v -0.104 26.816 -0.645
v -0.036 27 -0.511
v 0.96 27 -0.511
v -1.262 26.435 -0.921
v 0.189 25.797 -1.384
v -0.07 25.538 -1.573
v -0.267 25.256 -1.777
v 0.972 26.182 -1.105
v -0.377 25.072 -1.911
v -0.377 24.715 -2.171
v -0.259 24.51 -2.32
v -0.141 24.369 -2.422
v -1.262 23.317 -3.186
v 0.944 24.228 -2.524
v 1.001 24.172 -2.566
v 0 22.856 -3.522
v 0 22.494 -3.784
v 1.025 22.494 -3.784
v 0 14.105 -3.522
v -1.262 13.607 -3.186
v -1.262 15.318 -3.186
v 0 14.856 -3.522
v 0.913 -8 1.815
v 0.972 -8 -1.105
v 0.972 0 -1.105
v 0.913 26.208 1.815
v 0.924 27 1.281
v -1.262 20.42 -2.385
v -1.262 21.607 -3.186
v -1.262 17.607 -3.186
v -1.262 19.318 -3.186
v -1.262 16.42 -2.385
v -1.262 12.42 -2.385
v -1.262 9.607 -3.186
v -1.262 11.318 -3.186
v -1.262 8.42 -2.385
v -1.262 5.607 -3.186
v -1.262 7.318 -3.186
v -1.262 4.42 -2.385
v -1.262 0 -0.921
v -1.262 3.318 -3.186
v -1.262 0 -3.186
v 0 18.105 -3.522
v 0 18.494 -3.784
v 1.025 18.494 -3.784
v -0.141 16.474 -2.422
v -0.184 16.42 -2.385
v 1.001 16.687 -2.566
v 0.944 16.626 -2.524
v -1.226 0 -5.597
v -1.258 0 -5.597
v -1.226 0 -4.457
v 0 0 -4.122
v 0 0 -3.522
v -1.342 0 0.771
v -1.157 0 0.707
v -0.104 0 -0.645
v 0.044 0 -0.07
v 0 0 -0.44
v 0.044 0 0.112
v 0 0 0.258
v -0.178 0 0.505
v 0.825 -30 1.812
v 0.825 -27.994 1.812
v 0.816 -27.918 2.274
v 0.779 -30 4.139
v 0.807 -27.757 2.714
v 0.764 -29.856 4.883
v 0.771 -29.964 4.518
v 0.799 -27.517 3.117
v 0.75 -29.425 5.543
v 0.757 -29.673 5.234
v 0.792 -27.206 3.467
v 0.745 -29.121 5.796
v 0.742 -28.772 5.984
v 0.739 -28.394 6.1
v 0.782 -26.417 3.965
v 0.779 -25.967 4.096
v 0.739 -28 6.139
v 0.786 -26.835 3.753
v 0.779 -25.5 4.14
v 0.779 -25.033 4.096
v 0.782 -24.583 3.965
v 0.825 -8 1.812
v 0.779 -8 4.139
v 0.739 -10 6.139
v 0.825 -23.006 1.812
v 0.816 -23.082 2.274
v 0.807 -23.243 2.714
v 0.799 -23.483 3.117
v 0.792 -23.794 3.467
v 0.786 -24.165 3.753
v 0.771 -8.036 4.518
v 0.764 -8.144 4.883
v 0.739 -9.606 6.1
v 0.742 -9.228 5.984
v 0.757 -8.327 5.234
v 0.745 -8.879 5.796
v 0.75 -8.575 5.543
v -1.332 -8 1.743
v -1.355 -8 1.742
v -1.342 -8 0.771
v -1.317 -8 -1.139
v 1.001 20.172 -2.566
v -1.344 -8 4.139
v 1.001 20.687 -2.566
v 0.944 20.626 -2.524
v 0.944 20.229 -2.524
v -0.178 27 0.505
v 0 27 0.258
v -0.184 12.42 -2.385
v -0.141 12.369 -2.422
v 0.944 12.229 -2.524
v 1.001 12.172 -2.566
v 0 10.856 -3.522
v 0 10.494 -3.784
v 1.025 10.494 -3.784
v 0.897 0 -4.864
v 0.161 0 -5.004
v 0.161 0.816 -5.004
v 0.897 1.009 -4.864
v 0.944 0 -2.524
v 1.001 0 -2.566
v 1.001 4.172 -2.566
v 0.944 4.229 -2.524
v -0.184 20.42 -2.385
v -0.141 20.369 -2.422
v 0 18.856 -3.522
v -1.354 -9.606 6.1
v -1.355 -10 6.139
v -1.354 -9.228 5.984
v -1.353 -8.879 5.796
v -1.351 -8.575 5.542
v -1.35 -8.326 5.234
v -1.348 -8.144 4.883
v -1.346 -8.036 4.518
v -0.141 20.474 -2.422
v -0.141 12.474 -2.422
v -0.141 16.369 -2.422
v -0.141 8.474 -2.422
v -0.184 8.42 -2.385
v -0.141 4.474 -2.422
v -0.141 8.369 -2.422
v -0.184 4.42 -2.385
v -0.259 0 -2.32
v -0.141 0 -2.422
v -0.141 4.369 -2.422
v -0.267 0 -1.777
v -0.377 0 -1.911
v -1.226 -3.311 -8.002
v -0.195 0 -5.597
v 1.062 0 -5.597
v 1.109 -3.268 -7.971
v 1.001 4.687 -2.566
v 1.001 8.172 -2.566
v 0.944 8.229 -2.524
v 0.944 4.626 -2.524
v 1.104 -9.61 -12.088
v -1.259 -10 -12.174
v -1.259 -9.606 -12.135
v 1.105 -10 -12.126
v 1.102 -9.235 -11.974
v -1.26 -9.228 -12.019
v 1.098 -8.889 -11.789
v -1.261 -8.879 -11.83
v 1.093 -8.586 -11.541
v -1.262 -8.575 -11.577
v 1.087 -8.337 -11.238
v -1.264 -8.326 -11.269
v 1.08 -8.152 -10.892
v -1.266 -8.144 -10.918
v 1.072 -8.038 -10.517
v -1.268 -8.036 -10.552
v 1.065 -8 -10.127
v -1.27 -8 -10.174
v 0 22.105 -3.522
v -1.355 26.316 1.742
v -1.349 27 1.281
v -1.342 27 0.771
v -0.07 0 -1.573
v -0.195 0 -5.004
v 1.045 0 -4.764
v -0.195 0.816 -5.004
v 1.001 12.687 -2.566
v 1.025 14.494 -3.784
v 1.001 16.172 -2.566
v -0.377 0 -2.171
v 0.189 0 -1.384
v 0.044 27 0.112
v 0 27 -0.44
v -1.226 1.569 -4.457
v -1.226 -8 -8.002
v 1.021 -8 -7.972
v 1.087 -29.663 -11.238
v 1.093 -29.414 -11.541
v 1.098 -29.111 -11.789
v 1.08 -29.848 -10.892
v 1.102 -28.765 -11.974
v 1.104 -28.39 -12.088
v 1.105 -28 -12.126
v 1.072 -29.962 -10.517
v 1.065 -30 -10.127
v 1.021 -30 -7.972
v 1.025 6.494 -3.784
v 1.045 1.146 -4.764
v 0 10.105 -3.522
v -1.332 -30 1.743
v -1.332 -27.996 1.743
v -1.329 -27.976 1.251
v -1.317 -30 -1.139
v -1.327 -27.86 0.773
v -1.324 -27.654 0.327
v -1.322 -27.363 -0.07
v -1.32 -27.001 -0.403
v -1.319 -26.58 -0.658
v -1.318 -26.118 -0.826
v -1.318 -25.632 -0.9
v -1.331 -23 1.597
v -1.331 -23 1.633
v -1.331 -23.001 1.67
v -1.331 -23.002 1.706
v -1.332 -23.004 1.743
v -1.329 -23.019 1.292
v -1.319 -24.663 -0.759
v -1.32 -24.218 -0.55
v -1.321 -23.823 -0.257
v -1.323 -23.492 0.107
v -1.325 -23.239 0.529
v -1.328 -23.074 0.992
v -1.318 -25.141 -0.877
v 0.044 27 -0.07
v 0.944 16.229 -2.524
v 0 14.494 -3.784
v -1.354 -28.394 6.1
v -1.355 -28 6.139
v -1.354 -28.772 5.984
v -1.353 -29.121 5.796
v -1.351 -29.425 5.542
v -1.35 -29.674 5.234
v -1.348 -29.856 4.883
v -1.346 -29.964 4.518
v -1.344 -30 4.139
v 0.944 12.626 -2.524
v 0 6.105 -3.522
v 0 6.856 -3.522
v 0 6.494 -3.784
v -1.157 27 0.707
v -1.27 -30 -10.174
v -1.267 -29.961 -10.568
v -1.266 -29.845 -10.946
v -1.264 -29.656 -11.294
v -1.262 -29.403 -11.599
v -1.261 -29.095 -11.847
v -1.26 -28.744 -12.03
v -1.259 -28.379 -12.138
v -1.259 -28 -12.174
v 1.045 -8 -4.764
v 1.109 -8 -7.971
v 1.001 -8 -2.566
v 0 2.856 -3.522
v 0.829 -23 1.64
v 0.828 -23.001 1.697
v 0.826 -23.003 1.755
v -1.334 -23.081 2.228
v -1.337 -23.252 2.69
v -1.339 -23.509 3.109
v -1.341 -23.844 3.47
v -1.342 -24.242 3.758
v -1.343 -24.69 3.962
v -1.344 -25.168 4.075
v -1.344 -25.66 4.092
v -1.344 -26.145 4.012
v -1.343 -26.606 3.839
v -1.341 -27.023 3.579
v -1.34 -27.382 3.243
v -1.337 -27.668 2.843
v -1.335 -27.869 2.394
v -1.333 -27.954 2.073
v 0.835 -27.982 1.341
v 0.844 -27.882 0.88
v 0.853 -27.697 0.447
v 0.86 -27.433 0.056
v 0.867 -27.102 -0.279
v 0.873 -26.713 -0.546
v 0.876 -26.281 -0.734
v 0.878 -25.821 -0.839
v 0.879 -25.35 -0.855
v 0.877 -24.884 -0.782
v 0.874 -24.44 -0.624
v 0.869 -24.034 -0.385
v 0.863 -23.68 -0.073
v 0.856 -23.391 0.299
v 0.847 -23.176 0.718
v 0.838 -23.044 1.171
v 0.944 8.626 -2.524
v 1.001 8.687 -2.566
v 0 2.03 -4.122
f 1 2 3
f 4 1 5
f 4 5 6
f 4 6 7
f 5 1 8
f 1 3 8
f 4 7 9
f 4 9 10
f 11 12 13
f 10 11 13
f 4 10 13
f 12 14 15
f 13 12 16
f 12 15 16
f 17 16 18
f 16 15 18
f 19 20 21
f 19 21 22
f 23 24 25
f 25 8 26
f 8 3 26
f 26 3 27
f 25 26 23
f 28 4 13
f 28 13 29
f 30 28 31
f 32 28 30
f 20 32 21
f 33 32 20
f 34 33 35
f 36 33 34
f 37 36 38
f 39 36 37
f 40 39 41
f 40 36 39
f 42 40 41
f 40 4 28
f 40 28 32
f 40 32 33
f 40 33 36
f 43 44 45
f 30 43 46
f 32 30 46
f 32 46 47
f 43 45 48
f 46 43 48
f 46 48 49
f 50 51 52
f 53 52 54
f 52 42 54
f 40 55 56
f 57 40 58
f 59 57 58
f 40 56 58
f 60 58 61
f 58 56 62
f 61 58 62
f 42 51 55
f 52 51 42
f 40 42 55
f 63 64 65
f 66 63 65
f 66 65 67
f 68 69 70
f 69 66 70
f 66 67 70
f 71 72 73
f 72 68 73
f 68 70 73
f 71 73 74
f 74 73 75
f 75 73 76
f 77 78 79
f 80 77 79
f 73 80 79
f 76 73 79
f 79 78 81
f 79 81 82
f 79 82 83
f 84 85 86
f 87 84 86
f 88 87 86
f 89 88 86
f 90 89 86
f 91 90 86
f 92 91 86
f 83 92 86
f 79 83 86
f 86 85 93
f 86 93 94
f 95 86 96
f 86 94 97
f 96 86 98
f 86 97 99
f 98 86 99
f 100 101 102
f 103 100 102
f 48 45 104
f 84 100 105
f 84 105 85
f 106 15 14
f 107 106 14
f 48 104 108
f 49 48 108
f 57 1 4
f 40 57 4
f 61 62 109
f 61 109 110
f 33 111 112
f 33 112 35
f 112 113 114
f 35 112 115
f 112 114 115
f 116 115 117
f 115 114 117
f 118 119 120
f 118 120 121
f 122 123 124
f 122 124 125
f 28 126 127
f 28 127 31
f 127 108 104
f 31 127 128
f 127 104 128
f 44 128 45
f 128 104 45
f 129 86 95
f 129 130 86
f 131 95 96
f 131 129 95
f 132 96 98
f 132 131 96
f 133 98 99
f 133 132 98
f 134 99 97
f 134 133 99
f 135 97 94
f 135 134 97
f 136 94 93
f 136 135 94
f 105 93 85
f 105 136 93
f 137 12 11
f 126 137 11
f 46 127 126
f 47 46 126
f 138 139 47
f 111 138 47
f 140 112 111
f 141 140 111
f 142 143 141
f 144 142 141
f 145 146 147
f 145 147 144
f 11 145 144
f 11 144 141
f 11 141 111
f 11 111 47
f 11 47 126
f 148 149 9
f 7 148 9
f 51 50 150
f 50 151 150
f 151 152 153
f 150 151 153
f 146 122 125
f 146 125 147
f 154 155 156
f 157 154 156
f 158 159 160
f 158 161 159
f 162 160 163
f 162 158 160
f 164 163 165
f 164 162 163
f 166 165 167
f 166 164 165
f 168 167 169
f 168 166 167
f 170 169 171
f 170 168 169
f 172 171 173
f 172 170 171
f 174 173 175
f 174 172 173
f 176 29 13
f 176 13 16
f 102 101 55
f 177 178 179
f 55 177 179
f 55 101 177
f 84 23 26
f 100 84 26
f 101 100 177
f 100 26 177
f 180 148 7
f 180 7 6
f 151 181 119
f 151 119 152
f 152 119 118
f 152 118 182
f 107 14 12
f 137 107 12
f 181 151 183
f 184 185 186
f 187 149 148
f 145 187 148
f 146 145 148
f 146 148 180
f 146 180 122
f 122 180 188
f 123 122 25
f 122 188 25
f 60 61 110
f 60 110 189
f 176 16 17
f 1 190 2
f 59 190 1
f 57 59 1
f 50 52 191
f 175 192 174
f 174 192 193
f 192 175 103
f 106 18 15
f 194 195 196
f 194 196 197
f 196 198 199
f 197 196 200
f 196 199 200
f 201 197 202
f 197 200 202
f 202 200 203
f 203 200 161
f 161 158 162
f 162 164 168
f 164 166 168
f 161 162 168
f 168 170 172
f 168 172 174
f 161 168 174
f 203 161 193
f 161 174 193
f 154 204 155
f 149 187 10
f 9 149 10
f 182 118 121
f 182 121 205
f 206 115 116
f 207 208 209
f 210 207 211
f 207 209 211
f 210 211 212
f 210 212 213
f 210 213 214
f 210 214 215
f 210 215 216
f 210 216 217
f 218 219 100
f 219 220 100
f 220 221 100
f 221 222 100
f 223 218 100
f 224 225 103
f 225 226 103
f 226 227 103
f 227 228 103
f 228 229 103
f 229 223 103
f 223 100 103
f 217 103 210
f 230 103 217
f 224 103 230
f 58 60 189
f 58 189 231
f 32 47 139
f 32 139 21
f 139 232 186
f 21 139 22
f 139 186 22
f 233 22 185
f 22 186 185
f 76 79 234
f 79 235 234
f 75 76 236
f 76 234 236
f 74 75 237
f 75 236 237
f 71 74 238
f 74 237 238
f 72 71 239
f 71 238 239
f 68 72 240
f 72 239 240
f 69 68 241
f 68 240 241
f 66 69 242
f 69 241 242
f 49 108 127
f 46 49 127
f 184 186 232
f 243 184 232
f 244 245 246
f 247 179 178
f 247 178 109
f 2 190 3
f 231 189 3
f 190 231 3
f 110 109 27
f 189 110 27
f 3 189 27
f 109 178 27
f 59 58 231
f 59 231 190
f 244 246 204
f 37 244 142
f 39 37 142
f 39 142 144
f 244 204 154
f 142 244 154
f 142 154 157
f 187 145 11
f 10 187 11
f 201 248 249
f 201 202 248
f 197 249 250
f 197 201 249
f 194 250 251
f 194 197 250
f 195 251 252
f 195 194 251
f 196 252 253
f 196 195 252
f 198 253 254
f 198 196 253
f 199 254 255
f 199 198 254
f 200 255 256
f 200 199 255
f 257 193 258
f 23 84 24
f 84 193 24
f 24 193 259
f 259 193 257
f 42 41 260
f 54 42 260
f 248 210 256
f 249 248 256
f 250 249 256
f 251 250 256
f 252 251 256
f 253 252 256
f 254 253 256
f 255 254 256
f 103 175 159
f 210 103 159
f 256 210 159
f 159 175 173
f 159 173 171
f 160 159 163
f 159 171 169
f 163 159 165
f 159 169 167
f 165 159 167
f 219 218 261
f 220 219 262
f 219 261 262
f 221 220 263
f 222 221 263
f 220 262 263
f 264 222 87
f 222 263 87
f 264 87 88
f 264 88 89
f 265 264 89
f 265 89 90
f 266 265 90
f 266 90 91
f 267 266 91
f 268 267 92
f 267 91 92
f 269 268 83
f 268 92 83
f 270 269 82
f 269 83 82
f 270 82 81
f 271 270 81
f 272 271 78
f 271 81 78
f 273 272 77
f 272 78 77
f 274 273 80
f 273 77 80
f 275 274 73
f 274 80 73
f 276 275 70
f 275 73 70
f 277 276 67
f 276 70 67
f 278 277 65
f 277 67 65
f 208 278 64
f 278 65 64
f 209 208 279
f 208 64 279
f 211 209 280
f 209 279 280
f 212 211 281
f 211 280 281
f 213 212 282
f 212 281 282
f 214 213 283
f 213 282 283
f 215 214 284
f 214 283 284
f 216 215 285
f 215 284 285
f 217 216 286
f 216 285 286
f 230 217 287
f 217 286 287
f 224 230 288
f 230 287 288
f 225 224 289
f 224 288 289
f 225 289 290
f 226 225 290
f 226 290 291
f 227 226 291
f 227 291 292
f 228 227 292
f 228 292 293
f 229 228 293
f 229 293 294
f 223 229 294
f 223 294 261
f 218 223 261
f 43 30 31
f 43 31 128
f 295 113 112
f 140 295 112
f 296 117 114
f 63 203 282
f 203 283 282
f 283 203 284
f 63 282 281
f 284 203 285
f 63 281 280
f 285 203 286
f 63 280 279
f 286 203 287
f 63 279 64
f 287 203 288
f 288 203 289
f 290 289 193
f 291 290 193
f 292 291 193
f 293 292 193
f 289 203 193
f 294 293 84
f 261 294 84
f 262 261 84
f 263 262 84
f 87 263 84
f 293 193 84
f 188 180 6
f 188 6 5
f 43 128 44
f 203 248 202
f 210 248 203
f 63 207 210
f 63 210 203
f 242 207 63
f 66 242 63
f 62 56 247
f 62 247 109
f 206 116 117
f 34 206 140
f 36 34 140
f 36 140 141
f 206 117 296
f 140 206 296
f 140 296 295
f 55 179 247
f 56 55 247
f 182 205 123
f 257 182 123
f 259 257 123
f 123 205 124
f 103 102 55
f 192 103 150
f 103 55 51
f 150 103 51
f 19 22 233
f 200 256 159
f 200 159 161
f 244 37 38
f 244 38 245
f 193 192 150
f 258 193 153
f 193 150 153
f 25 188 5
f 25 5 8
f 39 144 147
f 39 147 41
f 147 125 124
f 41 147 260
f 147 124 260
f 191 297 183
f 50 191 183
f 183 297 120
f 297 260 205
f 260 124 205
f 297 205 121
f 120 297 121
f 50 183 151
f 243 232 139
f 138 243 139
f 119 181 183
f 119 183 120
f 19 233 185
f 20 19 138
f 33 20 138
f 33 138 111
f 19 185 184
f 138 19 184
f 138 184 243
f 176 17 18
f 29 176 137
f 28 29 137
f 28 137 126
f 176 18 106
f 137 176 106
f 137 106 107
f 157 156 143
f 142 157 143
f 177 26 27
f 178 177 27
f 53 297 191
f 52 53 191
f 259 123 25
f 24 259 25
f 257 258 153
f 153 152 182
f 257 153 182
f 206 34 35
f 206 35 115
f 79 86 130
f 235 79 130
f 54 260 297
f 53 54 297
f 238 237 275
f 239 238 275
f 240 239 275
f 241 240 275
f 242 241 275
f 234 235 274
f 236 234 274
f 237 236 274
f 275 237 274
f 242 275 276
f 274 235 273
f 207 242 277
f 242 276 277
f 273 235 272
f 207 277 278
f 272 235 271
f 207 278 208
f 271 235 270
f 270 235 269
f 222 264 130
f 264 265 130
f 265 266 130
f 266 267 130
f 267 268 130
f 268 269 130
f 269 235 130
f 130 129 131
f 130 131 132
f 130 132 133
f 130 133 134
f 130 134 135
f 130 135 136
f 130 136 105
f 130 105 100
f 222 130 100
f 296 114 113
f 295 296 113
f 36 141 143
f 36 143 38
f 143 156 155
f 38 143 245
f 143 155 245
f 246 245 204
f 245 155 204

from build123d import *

# Parameters (mm, degrees)
F1_DEPTH  = 27
F2_DEPTH  = 8
F4_DEPTH  = 22
F6_R      = 2
F8_DEPTH  = 20
F9_DEPTH  = 12.5
F5_R      = 2.5
F10_DEPTH = 2.4607981127
F11_DEPTH = 12.5


with BuildPart() as f1:
    # F0 (on Front) → F1 (new body)
    with BuildSketch(Plane.XZ):
        Polygon((-0.7496952344, -6.6809873255), (0.8741063205, -6.6809873255), (0.9227698261, -6.0829417354), (0, -5.9686545786), (-0.1947072298, -5.7400796882), (-0.1947072298, -5.5496009013), (-0.1947072298, -5.0035609814), (0.1608536688, -5.0035609814), (0.8973725199, -4.86387623), (1.0449768405, -4.7641876783), (1.0008919092, -2.5655001409), (0.9438757817, -2.5243218008), (-0.1411063758, -2.4221134883), (-0.2590392278, -2.3199048873), (-0.3769720528, -2.1705233078), (-0.3769720528, -1.9110710604), (-0.266901421, -1.7774139032), (-0.0703466601, -1.5729969897), (0.1891055828, -1.3843043544), (0.9716137966, -1.1052864284), (0.9130675168, 1.8146449861), (-1.3546038697, 1.7419207949), (-1.3418151463, 0.7710934816), (-1.1574519325, 0.707130723), (-0.1783869789, 0.5052616682), (0, 0.2579721058), (0.0436689517, 0.1116170257), (0.0436689517, -0.0700651218), (0, -0.439608231), (-0.1037999714, -0.6445581556), (-1.2615459958, -0.9208470772), (-1.2615459958, -3.1862834304), (0, -3.5216339192), (0, -4.1217343841), (-1.2262458836, -4.457084873), (-1.2262458836, -6.5044873415), align=None)
    extrude(amount=-F1_DEPTH)

    # F0 (on Front) → F2 (join)
    with BuildSketch(Plane.XZ):
        Polygon((-0.7496952344, -6.6809873255), (0.8741063205, -6.6809873255), (0.9227698261, -6.0829417354), (0, -5.9686545786), (-0.1947072298, -5.7400796882), (-0.1947072298, -5.5496009013), (-0.1947072298, -5.0035609814), (0.1608536688, -5.0035609814), (0.8973725199, -4.86387623), (1.0449768405, -4.7641876783), (1.0008919092, -2.5655001409), (0.9438757817, -2.5243218008), (-0.1411063758, -2.4221134883), (-0.2590392278, -2.3199048873), (-0.3769720528, -2.1705233078), (-0.3769720528, -1.9110710604), (-0.266901421, -1.7774139032), (-0.0703466601, -1.5729969897), (0.1891055828, -1.3843043544), (0.9716137966, -1.1052864284), (0.9130675168, 1.8146449861), (-1.3546038697, 1.7419207949), (-1.3418151463, 0.7710934816), (-1.1574519325, 0.707130723), (-0.1783869789, 0.5052616682), (0, 0.2579721058), (0.0436689517, 0.1116170257), (0.0436689517, -0.0700651218), (0, -0.439608231), (-0.1037999714, -0.6445581556), (-1.2615459958, -0.9208470772), (-1.2615459958, -3.1862834304), (0, -3.5216339192), (0, -4.1217343841), (-1.2262458836, -4.457084873), (-1.2262458836, -6.5044873415), align=None)
        Polygon((0.9227698261, -6.0829417354), (0.8741063205, -6.6809873255), (-0.7496952344, -6.6809873255), (-1.2262458836, -6.5044873415), (-1.2262458836, -4.457084873), (0, -4.1217343841), (0, -3.5216339192), (-1.2615459958, -3.1862834304), (-1.2615459958, -0.9208470772), (-0.1037999714, -0.6445581556), (0, -0.439608231), (0.0436689517, -0.0700651218), (0.0436689517, 0.1116170257), (0, 0.2579721058), (-0.1783869789, 0.5052616682), (-1.1574519325, 0.707130723), (-1.3418151463, 0.7710934816), (-1.2262458836, -8.0020884052), (1.1092817108, -7.9713224635), (1.0449768405, -4.7641876783), (0.8973725199, -4.86387623), (0.1608536688, -5.0035609814), (-0.1947072298, -5.0035609814), (-0.1947072298, -5.5496009013), (-0.1947072298, -5.7400796882), (0, -5.9686545786), align=None)
        Polygon((0.9438757817, -2.5243218008), (1.0008919092, -2.5655001409), (0.9716137966, -1.1052864284), (0.1891055828, -1.3843043544), (-0.0703466601, -1.5729969897), (-0.266901421, -1.7774139032), (-0.3769720528, -1.9110710604), (-0.3769720528, -2.1705233078), (-0.2590392278, -2.3199048873), (-0.1411063758, -2.4221134883), align=None)
    extrude(amount=F2_DEPTH)

    # F3 (on face) → F4 (join)
    with BuildSketch(Plane.XZ.offset(8)):
        Polygon((0.7385039935, 6.1391890049), (-1.3546038697, 6.1391890049), (-1.3316788356, 1.7426560004), (0.8252700079, 1.8118293212), align=None)
        Polygon((0.8252700079, 1.8118293212), (-1.3316788356, 1.7426560004), (-1.3166525213, -1.1390708706), (-1.2262458836, -8.0020884052), (1.0214509446, -7.9724794596), align=None)
        Polygon((-1.2262458836, -8.0020884052), (-1.3166525213, -1.1390708706), (-1.2591139525, -12.1737421996), (1.1047383155, -12.1263456218), (1.0214509446, -7.9724794596), align=None)
    extrude(amount=F4_DEPTH)

    # F6
    f6_edges = [f1.edges().sort_by_distance(p)[0] for p in [
        (-0.30805, -30, 6.139189),
        (-0.077188, -30, -12.150044),
        (-0.30805, -8, 6.139189),
        (-0.077188, -8, -12.150044),
    ]]
    fillet(f6_edges, radius=F6_R)

    # F7 (on Right) → F8 (cut, symmetric)
    with BuildSketch(Plane.YZ):
        Polygon((6.4942785373, -3.7844735536), (4.42, -2.3853550139), (0, -5.5966729877), (-11.7603398875, -14.1410600597), (31.9972857833, -14.0815703198), (31.4160363876, 5.4046616789), (20.8858734821, 5.4046616789), (28.2785118313, 0.4182641504), (22.4941027949, -3.7843550139), (20.42, -2.3853550139), (18.4942785373, -3.7844735536), (16.42, -2.3853550139), (14.4942785373, -3.7844735536), (12.42, -2.3853550139), (10.4942785373, -3.7844735536), (8.42, -2.3853550139), align=None)
    extrude(amount=F8_DEPTH, both=True, mode=Mode.SUBTRACT)

    # F7 (on Right) → F9 (cut, symmetric)
    with BuildSketch(Plane.YZ):
        Polygon((6.4942785373, -3.7844735536), (4.42, -2.3853550139), (0, -5.5966729877), (-11.7603398875, -14.1410600597), (31.9972857833, -14.0815703198), (31.4160363876, 5.4046616789), (20.8858734821, 5.4046616789), (28.2785118313, 0.4182641504), (22.4941027949, -3.7843550139), (20.42, -2.3853550139), (18.4942785373, -3.7844735536), (16.42, -2.3853550139), (14.4942785373, -3.7844735536), (12.42, -2.3853550139), (10.4942785373, -3.7844735536), (8.42, -2.3853550139), align=None)
    extrude(amount=F9_DEPTH, both=True, mode=Mode.SUBTRACT)

    # F5 (on face) → F10 (cut, through all)
    with BuildSketch(Plane(origin=(0.8612519677, 0, 0.0172685901), x_dir=(0, 1, 0), z_dir=(0.999799048, 0, 0.0200465376))):
        with Locations((-25.5, 1.6231508744)):
            Circle(F5_R)
    extrude(amount=-F10_DEPTH, mode=Mode.SUBTRACT)

    # F7 (on Right) → F11 (cut, symmetric)
    with BuildSketch(Plane.YZ):
        Polygon((6.4942785373, -3.7844735536), (4.42, -2.3853550139), (0, -5.5966729877), (-11.7603398875, -14.1410600597), (31.9972857833, -14.0815703198), (31.4160363876, 5.4046616789), (20.8858734821, 5.4046616789), (28.2785118313, 0.4182641504), (22.4941027949, -3.7843550139), (20.42, -2.3853550139), (18.4942785373, -3.7844735536), (16.42, -2.3853550139), (14.4942785373, -3.7844735536), (12.42, -2.3853550139), (10.4942785373, -3.7844735536), (8.42, -2.3853550139), align=None)
    extrude(amount=F11_DEPTH, both=True, mode=Mode.SUBTRACT)


solid = f1.part
